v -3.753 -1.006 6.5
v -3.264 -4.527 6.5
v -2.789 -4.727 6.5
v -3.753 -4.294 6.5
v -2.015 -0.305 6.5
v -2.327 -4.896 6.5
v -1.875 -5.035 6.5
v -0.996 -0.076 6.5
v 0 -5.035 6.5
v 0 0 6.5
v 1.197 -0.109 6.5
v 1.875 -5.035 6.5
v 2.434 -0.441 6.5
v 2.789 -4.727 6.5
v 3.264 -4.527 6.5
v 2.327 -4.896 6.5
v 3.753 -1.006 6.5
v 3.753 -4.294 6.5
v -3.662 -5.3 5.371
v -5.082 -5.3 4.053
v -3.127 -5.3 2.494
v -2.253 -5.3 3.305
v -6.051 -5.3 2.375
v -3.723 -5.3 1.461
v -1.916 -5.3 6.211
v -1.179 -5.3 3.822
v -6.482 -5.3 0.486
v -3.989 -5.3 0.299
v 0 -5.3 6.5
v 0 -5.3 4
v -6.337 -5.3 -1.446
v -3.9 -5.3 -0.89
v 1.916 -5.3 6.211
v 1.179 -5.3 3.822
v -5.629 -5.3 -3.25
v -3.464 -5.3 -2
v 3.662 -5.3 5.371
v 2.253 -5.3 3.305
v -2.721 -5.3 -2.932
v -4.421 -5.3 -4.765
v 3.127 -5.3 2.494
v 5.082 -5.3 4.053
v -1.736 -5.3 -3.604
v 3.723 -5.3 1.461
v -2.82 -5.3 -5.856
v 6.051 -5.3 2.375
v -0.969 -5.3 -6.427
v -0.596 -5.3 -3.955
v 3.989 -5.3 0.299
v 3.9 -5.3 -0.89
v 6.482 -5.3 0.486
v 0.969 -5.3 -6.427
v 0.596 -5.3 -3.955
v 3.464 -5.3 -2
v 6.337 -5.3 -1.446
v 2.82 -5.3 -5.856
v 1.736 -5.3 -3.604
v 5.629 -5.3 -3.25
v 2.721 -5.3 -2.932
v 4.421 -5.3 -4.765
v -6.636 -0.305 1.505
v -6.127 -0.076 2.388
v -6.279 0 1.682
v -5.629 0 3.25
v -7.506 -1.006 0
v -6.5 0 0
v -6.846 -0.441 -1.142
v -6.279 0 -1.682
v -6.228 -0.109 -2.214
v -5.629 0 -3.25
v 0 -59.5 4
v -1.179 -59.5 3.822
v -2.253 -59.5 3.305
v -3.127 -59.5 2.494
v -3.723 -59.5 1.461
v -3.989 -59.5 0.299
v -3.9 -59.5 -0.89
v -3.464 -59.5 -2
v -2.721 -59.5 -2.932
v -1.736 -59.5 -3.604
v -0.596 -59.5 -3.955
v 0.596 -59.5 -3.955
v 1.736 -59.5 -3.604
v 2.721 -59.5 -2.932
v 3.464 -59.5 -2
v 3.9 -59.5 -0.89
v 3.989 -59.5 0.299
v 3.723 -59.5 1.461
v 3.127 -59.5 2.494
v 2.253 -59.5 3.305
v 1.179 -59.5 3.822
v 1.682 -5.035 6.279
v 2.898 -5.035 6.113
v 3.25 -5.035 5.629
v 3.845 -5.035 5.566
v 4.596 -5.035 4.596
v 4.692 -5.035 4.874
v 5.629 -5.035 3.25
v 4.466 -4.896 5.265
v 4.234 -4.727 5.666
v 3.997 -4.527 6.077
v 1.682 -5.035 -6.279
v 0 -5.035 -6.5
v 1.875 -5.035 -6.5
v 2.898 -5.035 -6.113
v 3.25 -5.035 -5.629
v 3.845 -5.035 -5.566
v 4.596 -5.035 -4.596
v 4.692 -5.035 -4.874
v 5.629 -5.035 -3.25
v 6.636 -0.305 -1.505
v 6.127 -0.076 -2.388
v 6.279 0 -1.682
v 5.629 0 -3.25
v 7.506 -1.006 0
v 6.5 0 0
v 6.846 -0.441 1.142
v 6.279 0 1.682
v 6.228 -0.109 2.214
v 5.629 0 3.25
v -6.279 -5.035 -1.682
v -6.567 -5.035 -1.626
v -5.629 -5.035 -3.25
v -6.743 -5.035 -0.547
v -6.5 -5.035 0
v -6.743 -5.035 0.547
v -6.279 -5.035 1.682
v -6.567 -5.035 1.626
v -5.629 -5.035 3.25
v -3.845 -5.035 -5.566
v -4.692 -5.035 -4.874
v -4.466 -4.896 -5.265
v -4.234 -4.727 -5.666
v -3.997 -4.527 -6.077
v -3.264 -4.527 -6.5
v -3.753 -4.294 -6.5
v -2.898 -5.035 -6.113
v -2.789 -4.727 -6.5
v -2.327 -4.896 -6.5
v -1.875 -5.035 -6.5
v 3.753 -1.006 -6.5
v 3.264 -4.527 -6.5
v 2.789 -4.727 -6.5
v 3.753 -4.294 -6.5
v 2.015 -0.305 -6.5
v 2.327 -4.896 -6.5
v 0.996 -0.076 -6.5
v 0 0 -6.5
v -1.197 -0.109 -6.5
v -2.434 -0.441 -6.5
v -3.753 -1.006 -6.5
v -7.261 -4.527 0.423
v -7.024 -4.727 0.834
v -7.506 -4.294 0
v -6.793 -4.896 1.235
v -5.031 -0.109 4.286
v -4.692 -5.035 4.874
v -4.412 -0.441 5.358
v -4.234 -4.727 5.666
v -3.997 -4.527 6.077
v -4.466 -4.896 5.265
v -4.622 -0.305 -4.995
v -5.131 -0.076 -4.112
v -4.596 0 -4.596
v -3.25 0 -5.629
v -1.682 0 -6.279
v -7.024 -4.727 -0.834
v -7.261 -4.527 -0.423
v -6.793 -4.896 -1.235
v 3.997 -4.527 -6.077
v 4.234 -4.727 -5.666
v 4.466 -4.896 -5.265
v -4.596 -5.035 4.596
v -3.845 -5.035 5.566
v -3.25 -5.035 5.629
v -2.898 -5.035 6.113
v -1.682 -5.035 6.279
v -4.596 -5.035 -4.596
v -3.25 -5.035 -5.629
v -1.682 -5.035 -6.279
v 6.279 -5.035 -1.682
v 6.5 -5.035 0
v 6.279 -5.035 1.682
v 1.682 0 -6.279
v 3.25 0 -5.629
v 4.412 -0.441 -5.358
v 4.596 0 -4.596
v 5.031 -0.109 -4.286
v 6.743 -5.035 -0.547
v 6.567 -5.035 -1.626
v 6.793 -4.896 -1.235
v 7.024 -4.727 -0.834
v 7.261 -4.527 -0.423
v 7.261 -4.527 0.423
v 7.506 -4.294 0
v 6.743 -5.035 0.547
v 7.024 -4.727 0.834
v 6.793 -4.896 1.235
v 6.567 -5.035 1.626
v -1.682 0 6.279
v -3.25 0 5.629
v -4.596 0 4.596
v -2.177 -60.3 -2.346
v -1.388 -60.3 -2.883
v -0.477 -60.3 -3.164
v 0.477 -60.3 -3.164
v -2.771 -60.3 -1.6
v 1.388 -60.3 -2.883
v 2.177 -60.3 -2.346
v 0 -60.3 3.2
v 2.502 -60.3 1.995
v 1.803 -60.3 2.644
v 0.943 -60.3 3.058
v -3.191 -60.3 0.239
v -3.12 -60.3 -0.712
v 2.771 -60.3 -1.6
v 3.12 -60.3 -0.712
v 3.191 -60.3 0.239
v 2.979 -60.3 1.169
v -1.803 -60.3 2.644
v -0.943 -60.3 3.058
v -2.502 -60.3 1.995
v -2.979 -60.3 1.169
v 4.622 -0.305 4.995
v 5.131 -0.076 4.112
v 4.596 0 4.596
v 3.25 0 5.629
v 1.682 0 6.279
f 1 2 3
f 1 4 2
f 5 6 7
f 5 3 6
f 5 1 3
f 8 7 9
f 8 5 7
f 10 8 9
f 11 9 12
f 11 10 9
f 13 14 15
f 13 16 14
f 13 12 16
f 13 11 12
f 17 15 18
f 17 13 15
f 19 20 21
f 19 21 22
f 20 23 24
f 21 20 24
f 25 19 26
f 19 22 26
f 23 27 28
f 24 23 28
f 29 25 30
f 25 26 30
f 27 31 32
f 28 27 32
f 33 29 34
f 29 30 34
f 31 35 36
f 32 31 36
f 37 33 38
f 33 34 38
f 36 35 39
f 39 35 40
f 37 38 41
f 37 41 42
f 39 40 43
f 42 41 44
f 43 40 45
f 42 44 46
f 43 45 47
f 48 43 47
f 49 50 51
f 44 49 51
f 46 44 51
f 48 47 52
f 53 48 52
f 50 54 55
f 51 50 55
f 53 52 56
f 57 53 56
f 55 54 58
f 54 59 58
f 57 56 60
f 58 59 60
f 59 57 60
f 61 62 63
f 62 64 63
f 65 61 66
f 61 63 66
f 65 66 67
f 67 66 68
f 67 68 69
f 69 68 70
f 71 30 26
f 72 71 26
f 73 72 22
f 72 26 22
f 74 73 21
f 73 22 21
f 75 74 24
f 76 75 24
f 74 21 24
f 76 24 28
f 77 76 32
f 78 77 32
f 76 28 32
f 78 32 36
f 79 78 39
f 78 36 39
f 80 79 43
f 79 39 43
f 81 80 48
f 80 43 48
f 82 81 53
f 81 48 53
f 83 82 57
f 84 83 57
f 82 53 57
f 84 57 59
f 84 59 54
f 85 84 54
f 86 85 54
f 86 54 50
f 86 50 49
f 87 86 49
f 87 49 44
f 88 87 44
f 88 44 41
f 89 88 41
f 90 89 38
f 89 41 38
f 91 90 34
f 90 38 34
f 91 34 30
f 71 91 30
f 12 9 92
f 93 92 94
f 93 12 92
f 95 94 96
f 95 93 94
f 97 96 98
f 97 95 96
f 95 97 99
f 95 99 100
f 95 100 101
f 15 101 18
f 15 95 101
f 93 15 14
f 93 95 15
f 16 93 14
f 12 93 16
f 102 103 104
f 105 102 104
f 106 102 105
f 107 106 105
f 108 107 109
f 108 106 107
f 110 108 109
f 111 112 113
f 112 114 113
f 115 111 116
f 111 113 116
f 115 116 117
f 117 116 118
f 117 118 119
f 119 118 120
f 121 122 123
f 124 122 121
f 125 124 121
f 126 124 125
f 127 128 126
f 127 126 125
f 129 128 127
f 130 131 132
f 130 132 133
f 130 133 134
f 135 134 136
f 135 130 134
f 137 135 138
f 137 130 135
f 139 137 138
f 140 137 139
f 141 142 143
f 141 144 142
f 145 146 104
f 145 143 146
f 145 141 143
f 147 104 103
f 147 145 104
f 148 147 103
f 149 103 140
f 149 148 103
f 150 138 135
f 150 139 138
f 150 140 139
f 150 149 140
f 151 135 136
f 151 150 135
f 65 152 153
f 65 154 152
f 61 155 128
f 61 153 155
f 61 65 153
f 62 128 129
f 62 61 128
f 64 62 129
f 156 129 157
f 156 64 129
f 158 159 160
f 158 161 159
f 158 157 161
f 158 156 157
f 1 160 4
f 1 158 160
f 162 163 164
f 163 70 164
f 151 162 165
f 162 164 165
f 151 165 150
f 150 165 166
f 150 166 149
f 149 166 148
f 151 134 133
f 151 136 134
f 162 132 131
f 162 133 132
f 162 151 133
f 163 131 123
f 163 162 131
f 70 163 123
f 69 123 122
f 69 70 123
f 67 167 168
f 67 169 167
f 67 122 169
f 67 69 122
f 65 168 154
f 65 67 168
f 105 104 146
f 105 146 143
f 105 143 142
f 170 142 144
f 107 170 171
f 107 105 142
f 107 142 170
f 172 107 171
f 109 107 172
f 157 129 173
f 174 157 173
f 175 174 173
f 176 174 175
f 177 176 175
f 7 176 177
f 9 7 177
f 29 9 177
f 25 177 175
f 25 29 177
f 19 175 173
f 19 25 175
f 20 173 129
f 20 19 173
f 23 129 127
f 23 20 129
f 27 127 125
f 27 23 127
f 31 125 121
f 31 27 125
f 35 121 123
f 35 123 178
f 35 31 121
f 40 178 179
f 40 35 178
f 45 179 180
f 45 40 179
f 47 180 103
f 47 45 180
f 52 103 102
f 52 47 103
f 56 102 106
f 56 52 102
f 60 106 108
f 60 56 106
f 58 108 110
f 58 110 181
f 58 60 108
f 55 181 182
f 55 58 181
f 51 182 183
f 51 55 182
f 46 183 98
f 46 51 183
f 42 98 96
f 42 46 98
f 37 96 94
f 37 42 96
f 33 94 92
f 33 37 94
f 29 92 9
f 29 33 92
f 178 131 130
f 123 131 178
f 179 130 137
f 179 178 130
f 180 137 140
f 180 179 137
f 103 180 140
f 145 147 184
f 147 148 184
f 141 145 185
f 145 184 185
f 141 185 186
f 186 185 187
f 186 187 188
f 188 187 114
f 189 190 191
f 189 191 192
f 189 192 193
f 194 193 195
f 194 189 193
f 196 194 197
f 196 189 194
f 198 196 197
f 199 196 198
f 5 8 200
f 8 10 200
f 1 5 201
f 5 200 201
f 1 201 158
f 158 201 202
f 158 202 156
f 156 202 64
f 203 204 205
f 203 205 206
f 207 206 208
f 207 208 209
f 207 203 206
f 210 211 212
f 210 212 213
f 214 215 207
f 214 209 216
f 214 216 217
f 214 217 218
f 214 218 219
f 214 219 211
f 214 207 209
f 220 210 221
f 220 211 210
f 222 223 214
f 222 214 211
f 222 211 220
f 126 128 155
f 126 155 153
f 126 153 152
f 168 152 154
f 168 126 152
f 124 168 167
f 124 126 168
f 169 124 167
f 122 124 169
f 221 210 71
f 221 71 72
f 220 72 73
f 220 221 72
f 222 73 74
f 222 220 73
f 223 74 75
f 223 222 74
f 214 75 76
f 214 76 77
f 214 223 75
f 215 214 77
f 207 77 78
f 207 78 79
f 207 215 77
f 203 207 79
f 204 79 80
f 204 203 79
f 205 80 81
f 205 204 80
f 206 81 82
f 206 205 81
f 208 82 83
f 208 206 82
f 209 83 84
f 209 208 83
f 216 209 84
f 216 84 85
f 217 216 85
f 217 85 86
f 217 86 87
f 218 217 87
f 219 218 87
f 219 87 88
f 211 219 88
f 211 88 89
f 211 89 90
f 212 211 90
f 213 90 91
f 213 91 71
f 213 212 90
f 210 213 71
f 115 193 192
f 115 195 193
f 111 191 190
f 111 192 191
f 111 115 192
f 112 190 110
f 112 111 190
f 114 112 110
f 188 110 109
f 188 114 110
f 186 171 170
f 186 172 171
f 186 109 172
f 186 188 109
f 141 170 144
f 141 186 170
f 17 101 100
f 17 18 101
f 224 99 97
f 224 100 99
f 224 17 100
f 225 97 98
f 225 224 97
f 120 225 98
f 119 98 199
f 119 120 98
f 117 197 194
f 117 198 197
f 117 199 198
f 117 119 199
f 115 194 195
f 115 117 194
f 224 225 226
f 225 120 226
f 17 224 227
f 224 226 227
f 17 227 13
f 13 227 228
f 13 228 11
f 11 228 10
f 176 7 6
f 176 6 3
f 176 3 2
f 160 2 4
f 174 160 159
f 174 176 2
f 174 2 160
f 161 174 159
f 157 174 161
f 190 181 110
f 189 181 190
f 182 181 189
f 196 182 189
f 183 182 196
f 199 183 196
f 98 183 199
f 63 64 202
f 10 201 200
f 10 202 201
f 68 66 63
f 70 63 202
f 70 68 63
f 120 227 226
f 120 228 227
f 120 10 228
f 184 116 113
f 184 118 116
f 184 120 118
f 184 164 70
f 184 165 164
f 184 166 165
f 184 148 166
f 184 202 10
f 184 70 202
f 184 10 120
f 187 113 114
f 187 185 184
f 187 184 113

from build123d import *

# Parameters (mm, degrees)
BOSS_EXTRUDE1_DEPTH = 5.3
SKETCH2_OUTSIDE_W   = 21.122
SKETCH2_OUTSIDE_H   = 19.11
SKETCH2_OUTSIDE_R   = 6.5
CUT_EXTRUDE1_DEPTH  = 0.265
SKETCH3_R           = 4
BOSS_EXTRUDE2_DEPTH = 55
CHAMFER1_SIZE       = 0.8


with BuildPart() as part:
    # Sketch1 → Boss-Extrude1 (new body)
    with BuildSketch(Plane(origin=(0, 0, 0), x_dir=(1, 0, 0), z_dir=(0, 1, 0))):
        Polygon((7.505553499, 0), (3.75277675, 6.5), (-3.75277675, 6.5), (-7.505553499, 0), (-3.75277675, -6.5), (3.75277675, -6.5), align=None)
    extrude(amount=-BOSS_EXTRUDE1_DEPTH)

    # Sketch4 → Cut-Revolve1 (revolve, cut)
    with BuildSketch(Plane(origin=(0, 0, 0), x_dir=(0, 0, -1), z_dir=(1, 0, 0))):
        Polygon((-6.5, 0), (-8.15, 0), (-8.15, -1.65), align=None)
        Polygon((-8.15, -3.65), (-6.5, -5.3), (-8.15, -5.3), align=None)
    revolve(axis=Axis((0, 0, 0), (0, -1, 0)), mode=Mode.SUBTRACT)

    # Sketch2 outside → Cut-Extrude1 (cut)
    with BuildSketch(Plane.XZ.offset(5.3)):
        Rectangle(SKETCH2_OUTSIDE_W, SKETCH2_OUTSIDE_H)
        with Locations(Location((0, 0, 0), (0, 0, 90))):
            Circle(SKETCH2_OUTSIDE_R, mode=Mode.SUBTRACT)
    extrude(amount=-CUT_EXTRUDE1_DEPTH, mode=Mode.SUBTRACT)

    # Sketch3 → Boss-Extrude2 (add)
    with BuildSketch(Plane.XZ.offset(5.3)):
        with Locations(Location((0, 0, 0), (0, 0, 90))):
            Circle(SKETCH3_R)
    extrude(amount=BOSS_EXTRUDE2_DEPTH)

    # Chamfer1
    chamfer1_edges = [part.edges().sort_by_distance(p)[0] for p in [
        (0, -60.3, -4),
    ]]
    chamfer(chamfer1_edges, length=CHAMFER1_SIZE)


solid = part.part
